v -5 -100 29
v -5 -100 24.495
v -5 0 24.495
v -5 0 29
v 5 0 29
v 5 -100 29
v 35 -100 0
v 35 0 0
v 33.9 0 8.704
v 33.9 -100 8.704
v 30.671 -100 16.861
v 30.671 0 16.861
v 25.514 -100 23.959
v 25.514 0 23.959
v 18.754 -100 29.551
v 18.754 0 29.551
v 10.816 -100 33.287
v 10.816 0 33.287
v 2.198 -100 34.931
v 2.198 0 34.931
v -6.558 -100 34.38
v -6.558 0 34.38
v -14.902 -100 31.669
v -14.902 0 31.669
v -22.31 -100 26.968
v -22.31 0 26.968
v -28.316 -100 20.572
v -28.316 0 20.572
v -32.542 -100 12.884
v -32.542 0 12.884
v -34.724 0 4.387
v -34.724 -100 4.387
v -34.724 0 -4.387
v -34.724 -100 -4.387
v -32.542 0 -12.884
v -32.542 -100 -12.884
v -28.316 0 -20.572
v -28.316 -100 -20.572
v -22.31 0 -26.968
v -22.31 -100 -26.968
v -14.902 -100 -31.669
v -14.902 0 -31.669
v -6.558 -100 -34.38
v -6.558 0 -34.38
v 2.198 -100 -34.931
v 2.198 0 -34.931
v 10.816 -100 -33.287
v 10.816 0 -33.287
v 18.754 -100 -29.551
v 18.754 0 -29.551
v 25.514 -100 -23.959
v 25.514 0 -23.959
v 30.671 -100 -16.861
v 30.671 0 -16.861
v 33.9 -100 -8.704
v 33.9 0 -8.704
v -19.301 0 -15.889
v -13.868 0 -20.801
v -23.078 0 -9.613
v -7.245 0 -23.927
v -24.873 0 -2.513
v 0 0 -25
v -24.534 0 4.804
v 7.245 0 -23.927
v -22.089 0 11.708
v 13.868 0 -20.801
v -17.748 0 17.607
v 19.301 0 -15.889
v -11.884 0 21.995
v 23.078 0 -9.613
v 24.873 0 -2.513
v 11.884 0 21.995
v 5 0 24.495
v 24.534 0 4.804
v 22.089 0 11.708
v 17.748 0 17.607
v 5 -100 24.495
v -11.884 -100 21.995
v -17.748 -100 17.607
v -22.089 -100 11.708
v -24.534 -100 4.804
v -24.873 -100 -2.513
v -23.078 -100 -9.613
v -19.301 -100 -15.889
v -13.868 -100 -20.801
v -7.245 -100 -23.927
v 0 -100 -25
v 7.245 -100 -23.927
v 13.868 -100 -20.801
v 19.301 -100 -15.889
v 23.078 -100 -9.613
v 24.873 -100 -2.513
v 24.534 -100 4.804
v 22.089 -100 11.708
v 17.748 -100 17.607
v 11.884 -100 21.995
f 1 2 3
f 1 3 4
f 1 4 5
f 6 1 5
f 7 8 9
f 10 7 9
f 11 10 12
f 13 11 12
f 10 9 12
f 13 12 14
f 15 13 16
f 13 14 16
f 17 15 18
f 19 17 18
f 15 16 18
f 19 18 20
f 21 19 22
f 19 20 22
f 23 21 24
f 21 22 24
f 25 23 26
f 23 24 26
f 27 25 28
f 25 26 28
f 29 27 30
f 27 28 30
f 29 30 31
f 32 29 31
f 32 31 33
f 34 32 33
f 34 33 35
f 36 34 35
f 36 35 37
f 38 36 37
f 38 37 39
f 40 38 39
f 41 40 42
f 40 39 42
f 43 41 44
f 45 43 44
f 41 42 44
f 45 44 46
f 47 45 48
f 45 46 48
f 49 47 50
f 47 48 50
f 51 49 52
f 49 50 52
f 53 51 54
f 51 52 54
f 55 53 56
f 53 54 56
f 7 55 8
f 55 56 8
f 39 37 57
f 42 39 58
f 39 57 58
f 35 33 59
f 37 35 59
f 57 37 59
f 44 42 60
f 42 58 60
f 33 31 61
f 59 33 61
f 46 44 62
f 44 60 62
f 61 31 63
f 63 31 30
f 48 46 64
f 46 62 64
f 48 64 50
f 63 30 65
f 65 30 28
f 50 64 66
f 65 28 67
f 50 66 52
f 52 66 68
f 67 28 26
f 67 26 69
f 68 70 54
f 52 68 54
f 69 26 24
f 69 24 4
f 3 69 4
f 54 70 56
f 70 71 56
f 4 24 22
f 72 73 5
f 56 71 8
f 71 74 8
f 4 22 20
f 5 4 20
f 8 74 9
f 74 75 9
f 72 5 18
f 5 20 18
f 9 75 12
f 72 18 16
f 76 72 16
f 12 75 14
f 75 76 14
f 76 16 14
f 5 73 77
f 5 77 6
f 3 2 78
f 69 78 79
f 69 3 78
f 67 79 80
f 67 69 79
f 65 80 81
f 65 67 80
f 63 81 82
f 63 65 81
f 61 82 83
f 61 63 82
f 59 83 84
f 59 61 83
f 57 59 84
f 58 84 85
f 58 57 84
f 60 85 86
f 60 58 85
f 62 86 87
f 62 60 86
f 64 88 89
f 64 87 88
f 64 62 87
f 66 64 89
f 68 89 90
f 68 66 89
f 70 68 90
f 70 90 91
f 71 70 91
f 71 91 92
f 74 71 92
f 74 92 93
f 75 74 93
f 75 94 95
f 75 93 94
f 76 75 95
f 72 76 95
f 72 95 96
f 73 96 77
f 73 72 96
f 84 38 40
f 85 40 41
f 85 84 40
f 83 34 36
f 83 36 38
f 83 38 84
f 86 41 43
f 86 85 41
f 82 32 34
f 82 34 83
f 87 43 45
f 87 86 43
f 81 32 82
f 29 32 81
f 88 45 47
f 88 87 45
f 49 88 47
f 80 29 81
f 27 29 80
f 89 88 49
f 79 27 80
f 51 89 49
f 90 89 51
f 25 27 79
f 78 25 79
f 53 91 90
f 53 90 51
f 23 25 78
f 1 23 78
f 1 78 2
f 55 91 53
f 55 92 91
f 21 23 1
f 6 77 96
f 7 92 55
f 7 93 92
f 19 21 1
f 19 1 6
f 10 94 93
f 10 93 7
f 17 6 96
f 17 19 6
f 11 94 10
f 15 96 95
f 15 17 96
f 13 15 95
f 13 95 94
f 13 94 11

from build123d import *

# Parameters (mm, degrees)
F0_R     = 35
F0_R_2   = 25
F1_DEPTH = 100
F2_W     = 10
F2_H     = 8
F3_DEPTH = 100.001


with BuildPart() as f1:
    # F0 (on Front) → F1 (new body)
    with BuildSketch(Plane.XZ):
        Circle(F0_R)
        Circle(F0_R_2, mode=Mode.SUBTRACT)
    extrude(amount=F1_DEPTH)

    # F2 (on Front) → F3 (cut, through all)
    with BuildSketch(Plane.XZ):
        with Locations((0, 25)):
            Rectangle(F2_W, F2_H)
    extrude(amount=F3_DEPTH, mode=Mode.SUBTRACT)


solid = f1.part
